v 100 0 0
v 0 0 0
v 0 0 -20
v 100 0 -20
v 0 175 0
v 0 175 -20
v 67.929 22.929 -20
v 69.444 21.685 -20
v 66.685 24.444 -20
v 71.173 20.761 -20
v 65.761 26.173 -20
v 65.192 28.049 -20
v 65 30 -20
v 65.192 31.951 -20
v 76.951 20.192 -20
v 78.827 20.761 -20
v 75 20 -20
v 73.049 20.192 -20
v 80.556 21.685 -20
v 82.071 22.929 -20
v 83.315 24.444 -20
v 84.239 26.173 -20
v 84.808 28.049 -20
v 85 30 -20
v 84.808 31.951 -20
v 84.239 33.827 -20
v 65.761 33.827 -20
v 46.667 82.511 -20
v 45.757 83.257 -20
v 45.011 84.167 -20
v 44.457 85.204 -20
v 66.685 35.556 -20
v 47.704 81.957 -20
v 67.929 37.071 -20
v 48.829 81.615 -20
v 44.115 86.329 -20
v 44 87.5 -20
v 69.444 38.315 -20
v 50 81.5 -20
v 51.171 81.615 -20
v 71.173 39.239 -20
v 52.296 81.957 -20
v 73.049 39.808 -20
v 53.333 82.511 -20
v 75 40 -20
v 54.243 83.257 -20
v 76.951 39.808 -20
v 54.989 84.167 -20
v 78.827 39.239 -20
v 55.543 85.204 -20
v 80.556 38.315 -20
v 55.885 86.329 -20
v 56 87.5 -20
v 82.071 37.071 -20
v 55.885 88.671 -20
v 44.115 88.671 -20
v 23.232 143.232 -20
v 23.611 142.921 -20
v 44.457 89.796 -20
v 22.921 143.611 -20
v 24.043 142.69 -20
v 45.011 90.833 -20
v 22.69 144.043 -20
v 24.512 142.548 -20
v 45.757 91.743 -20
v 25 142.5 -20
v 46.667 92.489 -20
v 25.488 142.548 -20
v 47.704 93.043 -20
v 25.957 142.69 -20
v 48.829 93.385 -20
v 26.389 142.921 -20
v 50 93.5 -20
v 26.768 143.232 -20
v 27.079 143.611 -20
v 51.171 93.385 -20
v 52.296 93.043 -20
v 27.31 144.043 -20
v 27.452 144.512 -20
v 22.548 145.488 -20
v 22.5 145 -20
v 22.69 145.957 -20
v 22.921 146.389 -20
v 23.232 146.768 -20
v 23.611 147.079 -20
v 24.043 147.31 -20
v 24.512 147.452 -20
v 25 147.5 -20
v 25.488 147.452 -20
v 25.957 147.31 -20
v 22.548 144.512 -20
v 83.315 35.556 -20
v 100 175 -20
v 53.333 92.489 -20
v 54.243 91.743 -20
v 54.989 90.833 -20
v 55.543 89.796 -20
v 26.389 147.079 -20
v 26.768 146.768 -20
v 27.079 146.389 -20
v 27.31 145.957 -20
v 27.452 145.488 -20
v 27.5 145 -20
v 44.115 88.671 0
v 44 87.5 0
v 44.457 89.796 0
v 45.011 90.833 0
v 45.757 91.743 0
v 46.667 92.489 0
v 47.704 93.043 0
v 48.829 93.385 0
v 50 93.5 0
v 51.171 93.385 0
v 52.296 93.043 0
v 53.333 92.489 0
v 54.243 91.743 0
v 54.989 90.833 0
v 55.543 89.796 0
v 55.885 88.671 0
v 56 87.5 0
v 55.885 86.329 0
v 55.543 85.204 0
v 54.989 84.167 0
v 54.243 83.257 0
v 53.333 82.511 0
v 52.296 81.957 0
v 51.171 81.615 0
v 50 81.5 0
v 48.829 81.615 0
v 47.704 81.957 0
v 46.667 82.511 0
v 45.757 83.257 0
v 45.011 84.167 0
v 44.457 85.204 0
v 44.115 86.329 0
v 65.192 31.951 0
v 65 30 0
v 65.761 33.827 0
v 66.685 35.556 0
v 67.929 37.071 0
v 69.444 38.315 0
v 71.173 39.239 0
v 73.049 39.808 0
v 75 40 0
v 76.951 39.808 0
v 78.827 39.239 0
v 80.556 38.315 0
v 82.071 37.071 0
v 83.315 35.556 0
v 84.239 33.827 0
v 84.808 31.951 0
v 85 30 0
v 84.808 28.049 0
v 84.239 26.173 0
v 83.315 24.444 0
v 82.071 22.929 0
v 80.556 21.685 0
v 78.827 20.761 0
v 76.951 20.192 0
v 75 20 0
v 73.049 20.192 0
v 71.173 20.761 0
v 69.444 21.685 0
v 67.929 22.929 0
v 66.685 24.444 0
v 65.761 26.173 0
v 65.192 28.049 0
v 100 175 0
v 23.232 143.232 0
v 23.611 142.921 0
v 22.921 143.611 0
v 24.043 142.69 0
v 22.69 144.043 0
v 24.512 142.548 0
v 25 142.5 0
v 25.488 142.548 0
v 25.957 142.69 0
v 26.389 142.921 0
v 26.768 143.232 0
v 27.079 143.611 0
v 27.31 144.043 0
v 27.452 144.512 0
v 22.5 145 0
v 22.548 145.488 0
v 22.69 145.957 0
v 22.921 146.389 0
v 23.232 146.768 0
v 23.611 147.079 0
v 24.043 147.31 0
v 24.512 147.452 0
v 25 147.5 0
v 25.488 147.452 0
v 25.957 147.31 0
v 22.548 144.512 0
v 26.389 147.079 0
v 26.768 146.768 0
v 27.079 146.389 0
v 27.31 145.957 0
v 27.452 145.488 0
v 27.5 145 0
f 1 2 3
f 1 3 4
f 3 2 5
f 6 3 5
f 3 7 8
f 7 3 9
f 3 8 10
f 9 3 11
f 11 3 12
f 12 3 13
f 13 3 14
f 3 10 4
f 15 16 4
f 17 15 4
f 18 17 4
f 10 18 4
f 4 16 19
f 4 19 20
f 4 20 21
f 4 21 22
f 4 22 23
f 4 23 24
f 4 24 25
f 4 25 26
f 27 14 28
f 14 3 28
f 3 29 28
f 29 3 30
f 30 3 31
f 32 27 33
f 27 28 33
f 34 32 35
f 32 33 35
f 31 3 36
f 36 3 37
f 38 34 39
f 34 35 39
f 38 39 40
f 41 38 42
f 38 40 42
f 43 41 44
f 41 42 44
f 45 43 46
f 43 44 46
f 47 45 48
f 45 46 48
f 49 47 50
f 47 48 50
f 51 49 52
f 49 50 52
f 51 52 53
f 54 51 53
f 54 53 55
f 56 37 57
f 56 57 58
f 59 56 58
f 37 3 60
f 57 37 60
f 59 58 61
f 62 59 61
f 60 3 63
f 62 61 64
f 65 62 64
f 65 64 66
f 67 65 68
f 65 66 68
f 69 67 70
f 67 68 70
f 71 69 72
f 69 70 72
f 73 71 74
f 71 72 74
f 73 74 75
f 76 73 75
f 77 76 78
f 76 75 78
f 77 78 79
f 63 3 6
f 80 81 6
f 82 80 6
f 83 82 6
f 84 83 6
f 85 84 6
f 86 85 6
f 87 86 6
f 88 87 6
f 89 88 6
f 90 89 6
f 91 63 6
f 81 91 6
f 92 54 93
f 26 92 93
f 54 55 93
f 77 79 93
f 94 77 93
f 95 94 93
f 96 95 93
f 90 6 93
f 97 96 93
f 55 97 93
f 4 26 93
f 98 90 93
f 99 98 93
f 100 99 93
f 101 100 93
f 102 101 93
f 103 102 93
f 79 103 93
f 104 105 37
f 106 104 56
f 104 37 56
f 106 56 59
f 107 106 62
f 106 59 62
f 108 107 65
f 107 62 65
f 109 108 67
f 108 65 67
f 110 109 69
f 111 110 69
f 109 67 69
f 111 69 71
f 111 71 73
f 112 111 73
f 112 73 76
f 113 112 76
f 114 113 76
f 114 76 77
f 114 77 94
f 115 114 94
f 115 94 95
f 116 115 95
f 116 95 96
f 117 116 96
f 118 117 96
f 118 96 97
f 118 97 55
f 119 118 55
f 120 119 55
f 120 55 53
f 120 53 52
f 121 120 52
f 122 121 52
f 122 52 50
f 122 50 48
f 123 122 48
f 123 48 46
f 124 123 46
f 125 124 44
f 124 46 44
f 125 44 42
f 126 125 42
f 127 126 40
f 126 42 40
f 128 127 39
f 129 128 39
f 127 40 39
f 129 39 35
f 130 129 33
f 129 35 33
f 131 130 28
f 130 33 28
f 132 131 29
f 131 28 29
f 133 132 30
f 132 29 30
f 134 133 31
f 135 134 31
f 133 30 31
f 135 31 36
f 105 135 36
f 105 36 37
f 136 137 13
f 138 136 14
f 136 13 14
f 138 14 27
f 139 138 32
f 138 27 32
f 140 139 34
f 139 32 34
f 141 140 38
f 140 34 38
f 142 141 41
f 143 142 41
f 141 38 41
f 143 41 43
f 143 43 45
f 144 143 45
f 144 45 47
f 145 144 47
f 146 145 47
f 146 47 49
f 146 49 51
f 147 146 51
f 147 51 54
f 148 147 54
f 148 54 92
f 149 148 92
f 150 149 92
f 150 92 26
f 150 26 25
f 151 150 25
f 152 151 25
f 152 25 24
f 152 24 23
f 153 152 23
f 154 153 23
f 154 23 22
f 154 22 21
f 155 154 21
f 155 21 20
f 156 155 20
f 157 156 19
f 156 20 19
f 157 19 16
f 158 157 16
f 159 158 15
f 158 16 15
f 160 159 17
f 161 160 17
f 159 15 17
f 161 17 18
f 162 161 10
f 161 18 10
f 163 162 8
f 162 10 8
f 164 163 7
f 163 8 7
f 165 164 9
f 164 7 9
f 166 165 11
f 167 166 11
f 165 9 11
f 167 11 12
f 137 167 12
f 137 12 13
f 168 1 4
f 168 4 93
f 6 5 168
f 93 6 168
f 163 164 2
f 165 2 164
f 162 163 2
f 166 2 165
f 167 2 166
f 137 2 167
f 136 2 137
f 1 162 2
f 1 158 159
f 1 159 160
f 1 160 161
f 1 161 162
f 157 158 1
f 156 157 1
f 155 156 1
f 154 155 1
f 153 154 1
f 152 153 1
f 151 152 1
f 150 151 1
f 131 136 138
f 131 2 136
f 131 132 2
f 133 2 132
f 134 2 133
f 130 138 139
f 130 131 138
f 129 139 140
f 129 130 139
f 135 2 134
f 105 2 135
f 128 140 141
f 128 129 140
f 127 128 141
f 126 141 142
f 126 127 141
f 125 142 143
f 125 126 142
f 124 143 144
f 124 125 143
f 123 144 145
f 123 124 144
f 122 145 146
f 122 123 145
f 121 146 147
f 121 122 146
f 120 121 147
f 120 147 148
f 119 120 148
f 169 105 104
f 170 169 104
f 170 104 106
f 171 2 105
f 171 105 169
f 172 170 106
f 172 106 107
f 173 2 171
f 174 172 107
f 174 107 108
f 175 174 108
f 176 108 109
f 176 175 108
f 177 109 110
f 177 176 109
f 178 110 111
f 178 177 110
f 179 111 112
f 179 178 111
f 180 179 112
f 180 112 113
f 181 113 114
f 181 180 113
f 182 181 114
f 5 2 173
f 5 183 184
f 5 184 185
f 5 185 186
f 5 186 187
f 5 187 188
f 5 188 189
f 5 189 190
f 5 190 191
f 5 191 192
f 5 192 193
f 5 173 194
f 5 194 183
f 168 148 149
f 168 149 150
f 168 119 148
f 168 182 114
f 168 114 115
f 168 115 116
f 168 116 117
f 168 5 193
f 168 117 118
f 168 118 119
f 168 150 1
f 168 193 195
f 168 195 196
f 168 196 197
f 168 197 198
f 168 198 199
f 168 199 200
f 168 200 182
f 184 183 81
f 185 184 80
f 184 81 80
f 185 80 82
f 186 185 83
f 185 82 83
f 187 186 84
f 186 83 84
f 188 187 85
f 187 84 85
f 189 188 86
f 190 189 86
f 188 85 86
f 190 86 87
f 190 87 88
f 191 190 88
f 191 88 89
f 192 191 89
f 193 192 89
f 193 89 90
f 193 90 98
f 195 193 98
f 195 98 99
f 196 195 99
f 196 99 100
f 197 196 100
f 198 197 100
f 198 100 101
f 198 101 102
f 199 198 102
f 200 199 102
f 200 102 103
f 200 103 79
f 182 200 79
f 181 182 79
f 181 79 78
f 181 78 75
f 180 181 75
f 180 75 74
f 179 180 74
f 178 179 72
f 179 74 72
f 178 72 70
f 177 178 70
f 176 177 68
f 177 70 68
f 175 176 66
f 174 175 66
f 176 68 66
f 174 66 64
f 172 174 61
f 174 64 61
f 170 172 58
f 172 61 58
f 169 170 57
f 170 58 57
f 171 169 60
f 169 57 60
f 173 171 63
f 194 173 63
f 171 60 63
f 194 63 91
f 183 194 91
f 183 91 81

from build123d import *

# Parameters (mm, degrees)
SKETCH1_W                  = 100
SKETCH1_H                  = 175
BOSS_EXTRUDE1_DEPTH        = 20
F_5_0_5_DIAMETER_HOLE1_D   = 5
F_12_0_12_DIAMETER_HOLE1_D = 12
F_20_0_20_DIAMETER_HOLE1_D = 20


with BuildPart() as part:
    # Sketch1 → Boss-Extrude1 (new body)
    with BuildSketch(Plane.XY):
        with Locations((50, 87.5)):
            Rectangle(SKETCH1_W, SKETCH1_H)
    extrude(amount=-BOSS_EXTRUDE1_DEPTH)

    # Ø5.0 (5) Diameter Hole1 (through all)
    with Locations(Plane.XY):
        with Locations((25, 145)):
            Hole(F_5_0_5_DIAMETER_HOLE1_D / 2)

    # Ø12.0 (12) Diameter Hole1 (through all)
    with Locations(Plane.XY):
        with Locations((50, 87.5)):
            Hole(F_12_0_12_DIAMETER_HOLE1_D / 2)

    # Ø20.0 (20) Diameter Hole1 (through all)
    with Locations(Plane.XY):
        with Locations((75, 30)):
            Hole(F_20_0_20_DIAMETER_HOLE1_D / 2)


solid = part.part
